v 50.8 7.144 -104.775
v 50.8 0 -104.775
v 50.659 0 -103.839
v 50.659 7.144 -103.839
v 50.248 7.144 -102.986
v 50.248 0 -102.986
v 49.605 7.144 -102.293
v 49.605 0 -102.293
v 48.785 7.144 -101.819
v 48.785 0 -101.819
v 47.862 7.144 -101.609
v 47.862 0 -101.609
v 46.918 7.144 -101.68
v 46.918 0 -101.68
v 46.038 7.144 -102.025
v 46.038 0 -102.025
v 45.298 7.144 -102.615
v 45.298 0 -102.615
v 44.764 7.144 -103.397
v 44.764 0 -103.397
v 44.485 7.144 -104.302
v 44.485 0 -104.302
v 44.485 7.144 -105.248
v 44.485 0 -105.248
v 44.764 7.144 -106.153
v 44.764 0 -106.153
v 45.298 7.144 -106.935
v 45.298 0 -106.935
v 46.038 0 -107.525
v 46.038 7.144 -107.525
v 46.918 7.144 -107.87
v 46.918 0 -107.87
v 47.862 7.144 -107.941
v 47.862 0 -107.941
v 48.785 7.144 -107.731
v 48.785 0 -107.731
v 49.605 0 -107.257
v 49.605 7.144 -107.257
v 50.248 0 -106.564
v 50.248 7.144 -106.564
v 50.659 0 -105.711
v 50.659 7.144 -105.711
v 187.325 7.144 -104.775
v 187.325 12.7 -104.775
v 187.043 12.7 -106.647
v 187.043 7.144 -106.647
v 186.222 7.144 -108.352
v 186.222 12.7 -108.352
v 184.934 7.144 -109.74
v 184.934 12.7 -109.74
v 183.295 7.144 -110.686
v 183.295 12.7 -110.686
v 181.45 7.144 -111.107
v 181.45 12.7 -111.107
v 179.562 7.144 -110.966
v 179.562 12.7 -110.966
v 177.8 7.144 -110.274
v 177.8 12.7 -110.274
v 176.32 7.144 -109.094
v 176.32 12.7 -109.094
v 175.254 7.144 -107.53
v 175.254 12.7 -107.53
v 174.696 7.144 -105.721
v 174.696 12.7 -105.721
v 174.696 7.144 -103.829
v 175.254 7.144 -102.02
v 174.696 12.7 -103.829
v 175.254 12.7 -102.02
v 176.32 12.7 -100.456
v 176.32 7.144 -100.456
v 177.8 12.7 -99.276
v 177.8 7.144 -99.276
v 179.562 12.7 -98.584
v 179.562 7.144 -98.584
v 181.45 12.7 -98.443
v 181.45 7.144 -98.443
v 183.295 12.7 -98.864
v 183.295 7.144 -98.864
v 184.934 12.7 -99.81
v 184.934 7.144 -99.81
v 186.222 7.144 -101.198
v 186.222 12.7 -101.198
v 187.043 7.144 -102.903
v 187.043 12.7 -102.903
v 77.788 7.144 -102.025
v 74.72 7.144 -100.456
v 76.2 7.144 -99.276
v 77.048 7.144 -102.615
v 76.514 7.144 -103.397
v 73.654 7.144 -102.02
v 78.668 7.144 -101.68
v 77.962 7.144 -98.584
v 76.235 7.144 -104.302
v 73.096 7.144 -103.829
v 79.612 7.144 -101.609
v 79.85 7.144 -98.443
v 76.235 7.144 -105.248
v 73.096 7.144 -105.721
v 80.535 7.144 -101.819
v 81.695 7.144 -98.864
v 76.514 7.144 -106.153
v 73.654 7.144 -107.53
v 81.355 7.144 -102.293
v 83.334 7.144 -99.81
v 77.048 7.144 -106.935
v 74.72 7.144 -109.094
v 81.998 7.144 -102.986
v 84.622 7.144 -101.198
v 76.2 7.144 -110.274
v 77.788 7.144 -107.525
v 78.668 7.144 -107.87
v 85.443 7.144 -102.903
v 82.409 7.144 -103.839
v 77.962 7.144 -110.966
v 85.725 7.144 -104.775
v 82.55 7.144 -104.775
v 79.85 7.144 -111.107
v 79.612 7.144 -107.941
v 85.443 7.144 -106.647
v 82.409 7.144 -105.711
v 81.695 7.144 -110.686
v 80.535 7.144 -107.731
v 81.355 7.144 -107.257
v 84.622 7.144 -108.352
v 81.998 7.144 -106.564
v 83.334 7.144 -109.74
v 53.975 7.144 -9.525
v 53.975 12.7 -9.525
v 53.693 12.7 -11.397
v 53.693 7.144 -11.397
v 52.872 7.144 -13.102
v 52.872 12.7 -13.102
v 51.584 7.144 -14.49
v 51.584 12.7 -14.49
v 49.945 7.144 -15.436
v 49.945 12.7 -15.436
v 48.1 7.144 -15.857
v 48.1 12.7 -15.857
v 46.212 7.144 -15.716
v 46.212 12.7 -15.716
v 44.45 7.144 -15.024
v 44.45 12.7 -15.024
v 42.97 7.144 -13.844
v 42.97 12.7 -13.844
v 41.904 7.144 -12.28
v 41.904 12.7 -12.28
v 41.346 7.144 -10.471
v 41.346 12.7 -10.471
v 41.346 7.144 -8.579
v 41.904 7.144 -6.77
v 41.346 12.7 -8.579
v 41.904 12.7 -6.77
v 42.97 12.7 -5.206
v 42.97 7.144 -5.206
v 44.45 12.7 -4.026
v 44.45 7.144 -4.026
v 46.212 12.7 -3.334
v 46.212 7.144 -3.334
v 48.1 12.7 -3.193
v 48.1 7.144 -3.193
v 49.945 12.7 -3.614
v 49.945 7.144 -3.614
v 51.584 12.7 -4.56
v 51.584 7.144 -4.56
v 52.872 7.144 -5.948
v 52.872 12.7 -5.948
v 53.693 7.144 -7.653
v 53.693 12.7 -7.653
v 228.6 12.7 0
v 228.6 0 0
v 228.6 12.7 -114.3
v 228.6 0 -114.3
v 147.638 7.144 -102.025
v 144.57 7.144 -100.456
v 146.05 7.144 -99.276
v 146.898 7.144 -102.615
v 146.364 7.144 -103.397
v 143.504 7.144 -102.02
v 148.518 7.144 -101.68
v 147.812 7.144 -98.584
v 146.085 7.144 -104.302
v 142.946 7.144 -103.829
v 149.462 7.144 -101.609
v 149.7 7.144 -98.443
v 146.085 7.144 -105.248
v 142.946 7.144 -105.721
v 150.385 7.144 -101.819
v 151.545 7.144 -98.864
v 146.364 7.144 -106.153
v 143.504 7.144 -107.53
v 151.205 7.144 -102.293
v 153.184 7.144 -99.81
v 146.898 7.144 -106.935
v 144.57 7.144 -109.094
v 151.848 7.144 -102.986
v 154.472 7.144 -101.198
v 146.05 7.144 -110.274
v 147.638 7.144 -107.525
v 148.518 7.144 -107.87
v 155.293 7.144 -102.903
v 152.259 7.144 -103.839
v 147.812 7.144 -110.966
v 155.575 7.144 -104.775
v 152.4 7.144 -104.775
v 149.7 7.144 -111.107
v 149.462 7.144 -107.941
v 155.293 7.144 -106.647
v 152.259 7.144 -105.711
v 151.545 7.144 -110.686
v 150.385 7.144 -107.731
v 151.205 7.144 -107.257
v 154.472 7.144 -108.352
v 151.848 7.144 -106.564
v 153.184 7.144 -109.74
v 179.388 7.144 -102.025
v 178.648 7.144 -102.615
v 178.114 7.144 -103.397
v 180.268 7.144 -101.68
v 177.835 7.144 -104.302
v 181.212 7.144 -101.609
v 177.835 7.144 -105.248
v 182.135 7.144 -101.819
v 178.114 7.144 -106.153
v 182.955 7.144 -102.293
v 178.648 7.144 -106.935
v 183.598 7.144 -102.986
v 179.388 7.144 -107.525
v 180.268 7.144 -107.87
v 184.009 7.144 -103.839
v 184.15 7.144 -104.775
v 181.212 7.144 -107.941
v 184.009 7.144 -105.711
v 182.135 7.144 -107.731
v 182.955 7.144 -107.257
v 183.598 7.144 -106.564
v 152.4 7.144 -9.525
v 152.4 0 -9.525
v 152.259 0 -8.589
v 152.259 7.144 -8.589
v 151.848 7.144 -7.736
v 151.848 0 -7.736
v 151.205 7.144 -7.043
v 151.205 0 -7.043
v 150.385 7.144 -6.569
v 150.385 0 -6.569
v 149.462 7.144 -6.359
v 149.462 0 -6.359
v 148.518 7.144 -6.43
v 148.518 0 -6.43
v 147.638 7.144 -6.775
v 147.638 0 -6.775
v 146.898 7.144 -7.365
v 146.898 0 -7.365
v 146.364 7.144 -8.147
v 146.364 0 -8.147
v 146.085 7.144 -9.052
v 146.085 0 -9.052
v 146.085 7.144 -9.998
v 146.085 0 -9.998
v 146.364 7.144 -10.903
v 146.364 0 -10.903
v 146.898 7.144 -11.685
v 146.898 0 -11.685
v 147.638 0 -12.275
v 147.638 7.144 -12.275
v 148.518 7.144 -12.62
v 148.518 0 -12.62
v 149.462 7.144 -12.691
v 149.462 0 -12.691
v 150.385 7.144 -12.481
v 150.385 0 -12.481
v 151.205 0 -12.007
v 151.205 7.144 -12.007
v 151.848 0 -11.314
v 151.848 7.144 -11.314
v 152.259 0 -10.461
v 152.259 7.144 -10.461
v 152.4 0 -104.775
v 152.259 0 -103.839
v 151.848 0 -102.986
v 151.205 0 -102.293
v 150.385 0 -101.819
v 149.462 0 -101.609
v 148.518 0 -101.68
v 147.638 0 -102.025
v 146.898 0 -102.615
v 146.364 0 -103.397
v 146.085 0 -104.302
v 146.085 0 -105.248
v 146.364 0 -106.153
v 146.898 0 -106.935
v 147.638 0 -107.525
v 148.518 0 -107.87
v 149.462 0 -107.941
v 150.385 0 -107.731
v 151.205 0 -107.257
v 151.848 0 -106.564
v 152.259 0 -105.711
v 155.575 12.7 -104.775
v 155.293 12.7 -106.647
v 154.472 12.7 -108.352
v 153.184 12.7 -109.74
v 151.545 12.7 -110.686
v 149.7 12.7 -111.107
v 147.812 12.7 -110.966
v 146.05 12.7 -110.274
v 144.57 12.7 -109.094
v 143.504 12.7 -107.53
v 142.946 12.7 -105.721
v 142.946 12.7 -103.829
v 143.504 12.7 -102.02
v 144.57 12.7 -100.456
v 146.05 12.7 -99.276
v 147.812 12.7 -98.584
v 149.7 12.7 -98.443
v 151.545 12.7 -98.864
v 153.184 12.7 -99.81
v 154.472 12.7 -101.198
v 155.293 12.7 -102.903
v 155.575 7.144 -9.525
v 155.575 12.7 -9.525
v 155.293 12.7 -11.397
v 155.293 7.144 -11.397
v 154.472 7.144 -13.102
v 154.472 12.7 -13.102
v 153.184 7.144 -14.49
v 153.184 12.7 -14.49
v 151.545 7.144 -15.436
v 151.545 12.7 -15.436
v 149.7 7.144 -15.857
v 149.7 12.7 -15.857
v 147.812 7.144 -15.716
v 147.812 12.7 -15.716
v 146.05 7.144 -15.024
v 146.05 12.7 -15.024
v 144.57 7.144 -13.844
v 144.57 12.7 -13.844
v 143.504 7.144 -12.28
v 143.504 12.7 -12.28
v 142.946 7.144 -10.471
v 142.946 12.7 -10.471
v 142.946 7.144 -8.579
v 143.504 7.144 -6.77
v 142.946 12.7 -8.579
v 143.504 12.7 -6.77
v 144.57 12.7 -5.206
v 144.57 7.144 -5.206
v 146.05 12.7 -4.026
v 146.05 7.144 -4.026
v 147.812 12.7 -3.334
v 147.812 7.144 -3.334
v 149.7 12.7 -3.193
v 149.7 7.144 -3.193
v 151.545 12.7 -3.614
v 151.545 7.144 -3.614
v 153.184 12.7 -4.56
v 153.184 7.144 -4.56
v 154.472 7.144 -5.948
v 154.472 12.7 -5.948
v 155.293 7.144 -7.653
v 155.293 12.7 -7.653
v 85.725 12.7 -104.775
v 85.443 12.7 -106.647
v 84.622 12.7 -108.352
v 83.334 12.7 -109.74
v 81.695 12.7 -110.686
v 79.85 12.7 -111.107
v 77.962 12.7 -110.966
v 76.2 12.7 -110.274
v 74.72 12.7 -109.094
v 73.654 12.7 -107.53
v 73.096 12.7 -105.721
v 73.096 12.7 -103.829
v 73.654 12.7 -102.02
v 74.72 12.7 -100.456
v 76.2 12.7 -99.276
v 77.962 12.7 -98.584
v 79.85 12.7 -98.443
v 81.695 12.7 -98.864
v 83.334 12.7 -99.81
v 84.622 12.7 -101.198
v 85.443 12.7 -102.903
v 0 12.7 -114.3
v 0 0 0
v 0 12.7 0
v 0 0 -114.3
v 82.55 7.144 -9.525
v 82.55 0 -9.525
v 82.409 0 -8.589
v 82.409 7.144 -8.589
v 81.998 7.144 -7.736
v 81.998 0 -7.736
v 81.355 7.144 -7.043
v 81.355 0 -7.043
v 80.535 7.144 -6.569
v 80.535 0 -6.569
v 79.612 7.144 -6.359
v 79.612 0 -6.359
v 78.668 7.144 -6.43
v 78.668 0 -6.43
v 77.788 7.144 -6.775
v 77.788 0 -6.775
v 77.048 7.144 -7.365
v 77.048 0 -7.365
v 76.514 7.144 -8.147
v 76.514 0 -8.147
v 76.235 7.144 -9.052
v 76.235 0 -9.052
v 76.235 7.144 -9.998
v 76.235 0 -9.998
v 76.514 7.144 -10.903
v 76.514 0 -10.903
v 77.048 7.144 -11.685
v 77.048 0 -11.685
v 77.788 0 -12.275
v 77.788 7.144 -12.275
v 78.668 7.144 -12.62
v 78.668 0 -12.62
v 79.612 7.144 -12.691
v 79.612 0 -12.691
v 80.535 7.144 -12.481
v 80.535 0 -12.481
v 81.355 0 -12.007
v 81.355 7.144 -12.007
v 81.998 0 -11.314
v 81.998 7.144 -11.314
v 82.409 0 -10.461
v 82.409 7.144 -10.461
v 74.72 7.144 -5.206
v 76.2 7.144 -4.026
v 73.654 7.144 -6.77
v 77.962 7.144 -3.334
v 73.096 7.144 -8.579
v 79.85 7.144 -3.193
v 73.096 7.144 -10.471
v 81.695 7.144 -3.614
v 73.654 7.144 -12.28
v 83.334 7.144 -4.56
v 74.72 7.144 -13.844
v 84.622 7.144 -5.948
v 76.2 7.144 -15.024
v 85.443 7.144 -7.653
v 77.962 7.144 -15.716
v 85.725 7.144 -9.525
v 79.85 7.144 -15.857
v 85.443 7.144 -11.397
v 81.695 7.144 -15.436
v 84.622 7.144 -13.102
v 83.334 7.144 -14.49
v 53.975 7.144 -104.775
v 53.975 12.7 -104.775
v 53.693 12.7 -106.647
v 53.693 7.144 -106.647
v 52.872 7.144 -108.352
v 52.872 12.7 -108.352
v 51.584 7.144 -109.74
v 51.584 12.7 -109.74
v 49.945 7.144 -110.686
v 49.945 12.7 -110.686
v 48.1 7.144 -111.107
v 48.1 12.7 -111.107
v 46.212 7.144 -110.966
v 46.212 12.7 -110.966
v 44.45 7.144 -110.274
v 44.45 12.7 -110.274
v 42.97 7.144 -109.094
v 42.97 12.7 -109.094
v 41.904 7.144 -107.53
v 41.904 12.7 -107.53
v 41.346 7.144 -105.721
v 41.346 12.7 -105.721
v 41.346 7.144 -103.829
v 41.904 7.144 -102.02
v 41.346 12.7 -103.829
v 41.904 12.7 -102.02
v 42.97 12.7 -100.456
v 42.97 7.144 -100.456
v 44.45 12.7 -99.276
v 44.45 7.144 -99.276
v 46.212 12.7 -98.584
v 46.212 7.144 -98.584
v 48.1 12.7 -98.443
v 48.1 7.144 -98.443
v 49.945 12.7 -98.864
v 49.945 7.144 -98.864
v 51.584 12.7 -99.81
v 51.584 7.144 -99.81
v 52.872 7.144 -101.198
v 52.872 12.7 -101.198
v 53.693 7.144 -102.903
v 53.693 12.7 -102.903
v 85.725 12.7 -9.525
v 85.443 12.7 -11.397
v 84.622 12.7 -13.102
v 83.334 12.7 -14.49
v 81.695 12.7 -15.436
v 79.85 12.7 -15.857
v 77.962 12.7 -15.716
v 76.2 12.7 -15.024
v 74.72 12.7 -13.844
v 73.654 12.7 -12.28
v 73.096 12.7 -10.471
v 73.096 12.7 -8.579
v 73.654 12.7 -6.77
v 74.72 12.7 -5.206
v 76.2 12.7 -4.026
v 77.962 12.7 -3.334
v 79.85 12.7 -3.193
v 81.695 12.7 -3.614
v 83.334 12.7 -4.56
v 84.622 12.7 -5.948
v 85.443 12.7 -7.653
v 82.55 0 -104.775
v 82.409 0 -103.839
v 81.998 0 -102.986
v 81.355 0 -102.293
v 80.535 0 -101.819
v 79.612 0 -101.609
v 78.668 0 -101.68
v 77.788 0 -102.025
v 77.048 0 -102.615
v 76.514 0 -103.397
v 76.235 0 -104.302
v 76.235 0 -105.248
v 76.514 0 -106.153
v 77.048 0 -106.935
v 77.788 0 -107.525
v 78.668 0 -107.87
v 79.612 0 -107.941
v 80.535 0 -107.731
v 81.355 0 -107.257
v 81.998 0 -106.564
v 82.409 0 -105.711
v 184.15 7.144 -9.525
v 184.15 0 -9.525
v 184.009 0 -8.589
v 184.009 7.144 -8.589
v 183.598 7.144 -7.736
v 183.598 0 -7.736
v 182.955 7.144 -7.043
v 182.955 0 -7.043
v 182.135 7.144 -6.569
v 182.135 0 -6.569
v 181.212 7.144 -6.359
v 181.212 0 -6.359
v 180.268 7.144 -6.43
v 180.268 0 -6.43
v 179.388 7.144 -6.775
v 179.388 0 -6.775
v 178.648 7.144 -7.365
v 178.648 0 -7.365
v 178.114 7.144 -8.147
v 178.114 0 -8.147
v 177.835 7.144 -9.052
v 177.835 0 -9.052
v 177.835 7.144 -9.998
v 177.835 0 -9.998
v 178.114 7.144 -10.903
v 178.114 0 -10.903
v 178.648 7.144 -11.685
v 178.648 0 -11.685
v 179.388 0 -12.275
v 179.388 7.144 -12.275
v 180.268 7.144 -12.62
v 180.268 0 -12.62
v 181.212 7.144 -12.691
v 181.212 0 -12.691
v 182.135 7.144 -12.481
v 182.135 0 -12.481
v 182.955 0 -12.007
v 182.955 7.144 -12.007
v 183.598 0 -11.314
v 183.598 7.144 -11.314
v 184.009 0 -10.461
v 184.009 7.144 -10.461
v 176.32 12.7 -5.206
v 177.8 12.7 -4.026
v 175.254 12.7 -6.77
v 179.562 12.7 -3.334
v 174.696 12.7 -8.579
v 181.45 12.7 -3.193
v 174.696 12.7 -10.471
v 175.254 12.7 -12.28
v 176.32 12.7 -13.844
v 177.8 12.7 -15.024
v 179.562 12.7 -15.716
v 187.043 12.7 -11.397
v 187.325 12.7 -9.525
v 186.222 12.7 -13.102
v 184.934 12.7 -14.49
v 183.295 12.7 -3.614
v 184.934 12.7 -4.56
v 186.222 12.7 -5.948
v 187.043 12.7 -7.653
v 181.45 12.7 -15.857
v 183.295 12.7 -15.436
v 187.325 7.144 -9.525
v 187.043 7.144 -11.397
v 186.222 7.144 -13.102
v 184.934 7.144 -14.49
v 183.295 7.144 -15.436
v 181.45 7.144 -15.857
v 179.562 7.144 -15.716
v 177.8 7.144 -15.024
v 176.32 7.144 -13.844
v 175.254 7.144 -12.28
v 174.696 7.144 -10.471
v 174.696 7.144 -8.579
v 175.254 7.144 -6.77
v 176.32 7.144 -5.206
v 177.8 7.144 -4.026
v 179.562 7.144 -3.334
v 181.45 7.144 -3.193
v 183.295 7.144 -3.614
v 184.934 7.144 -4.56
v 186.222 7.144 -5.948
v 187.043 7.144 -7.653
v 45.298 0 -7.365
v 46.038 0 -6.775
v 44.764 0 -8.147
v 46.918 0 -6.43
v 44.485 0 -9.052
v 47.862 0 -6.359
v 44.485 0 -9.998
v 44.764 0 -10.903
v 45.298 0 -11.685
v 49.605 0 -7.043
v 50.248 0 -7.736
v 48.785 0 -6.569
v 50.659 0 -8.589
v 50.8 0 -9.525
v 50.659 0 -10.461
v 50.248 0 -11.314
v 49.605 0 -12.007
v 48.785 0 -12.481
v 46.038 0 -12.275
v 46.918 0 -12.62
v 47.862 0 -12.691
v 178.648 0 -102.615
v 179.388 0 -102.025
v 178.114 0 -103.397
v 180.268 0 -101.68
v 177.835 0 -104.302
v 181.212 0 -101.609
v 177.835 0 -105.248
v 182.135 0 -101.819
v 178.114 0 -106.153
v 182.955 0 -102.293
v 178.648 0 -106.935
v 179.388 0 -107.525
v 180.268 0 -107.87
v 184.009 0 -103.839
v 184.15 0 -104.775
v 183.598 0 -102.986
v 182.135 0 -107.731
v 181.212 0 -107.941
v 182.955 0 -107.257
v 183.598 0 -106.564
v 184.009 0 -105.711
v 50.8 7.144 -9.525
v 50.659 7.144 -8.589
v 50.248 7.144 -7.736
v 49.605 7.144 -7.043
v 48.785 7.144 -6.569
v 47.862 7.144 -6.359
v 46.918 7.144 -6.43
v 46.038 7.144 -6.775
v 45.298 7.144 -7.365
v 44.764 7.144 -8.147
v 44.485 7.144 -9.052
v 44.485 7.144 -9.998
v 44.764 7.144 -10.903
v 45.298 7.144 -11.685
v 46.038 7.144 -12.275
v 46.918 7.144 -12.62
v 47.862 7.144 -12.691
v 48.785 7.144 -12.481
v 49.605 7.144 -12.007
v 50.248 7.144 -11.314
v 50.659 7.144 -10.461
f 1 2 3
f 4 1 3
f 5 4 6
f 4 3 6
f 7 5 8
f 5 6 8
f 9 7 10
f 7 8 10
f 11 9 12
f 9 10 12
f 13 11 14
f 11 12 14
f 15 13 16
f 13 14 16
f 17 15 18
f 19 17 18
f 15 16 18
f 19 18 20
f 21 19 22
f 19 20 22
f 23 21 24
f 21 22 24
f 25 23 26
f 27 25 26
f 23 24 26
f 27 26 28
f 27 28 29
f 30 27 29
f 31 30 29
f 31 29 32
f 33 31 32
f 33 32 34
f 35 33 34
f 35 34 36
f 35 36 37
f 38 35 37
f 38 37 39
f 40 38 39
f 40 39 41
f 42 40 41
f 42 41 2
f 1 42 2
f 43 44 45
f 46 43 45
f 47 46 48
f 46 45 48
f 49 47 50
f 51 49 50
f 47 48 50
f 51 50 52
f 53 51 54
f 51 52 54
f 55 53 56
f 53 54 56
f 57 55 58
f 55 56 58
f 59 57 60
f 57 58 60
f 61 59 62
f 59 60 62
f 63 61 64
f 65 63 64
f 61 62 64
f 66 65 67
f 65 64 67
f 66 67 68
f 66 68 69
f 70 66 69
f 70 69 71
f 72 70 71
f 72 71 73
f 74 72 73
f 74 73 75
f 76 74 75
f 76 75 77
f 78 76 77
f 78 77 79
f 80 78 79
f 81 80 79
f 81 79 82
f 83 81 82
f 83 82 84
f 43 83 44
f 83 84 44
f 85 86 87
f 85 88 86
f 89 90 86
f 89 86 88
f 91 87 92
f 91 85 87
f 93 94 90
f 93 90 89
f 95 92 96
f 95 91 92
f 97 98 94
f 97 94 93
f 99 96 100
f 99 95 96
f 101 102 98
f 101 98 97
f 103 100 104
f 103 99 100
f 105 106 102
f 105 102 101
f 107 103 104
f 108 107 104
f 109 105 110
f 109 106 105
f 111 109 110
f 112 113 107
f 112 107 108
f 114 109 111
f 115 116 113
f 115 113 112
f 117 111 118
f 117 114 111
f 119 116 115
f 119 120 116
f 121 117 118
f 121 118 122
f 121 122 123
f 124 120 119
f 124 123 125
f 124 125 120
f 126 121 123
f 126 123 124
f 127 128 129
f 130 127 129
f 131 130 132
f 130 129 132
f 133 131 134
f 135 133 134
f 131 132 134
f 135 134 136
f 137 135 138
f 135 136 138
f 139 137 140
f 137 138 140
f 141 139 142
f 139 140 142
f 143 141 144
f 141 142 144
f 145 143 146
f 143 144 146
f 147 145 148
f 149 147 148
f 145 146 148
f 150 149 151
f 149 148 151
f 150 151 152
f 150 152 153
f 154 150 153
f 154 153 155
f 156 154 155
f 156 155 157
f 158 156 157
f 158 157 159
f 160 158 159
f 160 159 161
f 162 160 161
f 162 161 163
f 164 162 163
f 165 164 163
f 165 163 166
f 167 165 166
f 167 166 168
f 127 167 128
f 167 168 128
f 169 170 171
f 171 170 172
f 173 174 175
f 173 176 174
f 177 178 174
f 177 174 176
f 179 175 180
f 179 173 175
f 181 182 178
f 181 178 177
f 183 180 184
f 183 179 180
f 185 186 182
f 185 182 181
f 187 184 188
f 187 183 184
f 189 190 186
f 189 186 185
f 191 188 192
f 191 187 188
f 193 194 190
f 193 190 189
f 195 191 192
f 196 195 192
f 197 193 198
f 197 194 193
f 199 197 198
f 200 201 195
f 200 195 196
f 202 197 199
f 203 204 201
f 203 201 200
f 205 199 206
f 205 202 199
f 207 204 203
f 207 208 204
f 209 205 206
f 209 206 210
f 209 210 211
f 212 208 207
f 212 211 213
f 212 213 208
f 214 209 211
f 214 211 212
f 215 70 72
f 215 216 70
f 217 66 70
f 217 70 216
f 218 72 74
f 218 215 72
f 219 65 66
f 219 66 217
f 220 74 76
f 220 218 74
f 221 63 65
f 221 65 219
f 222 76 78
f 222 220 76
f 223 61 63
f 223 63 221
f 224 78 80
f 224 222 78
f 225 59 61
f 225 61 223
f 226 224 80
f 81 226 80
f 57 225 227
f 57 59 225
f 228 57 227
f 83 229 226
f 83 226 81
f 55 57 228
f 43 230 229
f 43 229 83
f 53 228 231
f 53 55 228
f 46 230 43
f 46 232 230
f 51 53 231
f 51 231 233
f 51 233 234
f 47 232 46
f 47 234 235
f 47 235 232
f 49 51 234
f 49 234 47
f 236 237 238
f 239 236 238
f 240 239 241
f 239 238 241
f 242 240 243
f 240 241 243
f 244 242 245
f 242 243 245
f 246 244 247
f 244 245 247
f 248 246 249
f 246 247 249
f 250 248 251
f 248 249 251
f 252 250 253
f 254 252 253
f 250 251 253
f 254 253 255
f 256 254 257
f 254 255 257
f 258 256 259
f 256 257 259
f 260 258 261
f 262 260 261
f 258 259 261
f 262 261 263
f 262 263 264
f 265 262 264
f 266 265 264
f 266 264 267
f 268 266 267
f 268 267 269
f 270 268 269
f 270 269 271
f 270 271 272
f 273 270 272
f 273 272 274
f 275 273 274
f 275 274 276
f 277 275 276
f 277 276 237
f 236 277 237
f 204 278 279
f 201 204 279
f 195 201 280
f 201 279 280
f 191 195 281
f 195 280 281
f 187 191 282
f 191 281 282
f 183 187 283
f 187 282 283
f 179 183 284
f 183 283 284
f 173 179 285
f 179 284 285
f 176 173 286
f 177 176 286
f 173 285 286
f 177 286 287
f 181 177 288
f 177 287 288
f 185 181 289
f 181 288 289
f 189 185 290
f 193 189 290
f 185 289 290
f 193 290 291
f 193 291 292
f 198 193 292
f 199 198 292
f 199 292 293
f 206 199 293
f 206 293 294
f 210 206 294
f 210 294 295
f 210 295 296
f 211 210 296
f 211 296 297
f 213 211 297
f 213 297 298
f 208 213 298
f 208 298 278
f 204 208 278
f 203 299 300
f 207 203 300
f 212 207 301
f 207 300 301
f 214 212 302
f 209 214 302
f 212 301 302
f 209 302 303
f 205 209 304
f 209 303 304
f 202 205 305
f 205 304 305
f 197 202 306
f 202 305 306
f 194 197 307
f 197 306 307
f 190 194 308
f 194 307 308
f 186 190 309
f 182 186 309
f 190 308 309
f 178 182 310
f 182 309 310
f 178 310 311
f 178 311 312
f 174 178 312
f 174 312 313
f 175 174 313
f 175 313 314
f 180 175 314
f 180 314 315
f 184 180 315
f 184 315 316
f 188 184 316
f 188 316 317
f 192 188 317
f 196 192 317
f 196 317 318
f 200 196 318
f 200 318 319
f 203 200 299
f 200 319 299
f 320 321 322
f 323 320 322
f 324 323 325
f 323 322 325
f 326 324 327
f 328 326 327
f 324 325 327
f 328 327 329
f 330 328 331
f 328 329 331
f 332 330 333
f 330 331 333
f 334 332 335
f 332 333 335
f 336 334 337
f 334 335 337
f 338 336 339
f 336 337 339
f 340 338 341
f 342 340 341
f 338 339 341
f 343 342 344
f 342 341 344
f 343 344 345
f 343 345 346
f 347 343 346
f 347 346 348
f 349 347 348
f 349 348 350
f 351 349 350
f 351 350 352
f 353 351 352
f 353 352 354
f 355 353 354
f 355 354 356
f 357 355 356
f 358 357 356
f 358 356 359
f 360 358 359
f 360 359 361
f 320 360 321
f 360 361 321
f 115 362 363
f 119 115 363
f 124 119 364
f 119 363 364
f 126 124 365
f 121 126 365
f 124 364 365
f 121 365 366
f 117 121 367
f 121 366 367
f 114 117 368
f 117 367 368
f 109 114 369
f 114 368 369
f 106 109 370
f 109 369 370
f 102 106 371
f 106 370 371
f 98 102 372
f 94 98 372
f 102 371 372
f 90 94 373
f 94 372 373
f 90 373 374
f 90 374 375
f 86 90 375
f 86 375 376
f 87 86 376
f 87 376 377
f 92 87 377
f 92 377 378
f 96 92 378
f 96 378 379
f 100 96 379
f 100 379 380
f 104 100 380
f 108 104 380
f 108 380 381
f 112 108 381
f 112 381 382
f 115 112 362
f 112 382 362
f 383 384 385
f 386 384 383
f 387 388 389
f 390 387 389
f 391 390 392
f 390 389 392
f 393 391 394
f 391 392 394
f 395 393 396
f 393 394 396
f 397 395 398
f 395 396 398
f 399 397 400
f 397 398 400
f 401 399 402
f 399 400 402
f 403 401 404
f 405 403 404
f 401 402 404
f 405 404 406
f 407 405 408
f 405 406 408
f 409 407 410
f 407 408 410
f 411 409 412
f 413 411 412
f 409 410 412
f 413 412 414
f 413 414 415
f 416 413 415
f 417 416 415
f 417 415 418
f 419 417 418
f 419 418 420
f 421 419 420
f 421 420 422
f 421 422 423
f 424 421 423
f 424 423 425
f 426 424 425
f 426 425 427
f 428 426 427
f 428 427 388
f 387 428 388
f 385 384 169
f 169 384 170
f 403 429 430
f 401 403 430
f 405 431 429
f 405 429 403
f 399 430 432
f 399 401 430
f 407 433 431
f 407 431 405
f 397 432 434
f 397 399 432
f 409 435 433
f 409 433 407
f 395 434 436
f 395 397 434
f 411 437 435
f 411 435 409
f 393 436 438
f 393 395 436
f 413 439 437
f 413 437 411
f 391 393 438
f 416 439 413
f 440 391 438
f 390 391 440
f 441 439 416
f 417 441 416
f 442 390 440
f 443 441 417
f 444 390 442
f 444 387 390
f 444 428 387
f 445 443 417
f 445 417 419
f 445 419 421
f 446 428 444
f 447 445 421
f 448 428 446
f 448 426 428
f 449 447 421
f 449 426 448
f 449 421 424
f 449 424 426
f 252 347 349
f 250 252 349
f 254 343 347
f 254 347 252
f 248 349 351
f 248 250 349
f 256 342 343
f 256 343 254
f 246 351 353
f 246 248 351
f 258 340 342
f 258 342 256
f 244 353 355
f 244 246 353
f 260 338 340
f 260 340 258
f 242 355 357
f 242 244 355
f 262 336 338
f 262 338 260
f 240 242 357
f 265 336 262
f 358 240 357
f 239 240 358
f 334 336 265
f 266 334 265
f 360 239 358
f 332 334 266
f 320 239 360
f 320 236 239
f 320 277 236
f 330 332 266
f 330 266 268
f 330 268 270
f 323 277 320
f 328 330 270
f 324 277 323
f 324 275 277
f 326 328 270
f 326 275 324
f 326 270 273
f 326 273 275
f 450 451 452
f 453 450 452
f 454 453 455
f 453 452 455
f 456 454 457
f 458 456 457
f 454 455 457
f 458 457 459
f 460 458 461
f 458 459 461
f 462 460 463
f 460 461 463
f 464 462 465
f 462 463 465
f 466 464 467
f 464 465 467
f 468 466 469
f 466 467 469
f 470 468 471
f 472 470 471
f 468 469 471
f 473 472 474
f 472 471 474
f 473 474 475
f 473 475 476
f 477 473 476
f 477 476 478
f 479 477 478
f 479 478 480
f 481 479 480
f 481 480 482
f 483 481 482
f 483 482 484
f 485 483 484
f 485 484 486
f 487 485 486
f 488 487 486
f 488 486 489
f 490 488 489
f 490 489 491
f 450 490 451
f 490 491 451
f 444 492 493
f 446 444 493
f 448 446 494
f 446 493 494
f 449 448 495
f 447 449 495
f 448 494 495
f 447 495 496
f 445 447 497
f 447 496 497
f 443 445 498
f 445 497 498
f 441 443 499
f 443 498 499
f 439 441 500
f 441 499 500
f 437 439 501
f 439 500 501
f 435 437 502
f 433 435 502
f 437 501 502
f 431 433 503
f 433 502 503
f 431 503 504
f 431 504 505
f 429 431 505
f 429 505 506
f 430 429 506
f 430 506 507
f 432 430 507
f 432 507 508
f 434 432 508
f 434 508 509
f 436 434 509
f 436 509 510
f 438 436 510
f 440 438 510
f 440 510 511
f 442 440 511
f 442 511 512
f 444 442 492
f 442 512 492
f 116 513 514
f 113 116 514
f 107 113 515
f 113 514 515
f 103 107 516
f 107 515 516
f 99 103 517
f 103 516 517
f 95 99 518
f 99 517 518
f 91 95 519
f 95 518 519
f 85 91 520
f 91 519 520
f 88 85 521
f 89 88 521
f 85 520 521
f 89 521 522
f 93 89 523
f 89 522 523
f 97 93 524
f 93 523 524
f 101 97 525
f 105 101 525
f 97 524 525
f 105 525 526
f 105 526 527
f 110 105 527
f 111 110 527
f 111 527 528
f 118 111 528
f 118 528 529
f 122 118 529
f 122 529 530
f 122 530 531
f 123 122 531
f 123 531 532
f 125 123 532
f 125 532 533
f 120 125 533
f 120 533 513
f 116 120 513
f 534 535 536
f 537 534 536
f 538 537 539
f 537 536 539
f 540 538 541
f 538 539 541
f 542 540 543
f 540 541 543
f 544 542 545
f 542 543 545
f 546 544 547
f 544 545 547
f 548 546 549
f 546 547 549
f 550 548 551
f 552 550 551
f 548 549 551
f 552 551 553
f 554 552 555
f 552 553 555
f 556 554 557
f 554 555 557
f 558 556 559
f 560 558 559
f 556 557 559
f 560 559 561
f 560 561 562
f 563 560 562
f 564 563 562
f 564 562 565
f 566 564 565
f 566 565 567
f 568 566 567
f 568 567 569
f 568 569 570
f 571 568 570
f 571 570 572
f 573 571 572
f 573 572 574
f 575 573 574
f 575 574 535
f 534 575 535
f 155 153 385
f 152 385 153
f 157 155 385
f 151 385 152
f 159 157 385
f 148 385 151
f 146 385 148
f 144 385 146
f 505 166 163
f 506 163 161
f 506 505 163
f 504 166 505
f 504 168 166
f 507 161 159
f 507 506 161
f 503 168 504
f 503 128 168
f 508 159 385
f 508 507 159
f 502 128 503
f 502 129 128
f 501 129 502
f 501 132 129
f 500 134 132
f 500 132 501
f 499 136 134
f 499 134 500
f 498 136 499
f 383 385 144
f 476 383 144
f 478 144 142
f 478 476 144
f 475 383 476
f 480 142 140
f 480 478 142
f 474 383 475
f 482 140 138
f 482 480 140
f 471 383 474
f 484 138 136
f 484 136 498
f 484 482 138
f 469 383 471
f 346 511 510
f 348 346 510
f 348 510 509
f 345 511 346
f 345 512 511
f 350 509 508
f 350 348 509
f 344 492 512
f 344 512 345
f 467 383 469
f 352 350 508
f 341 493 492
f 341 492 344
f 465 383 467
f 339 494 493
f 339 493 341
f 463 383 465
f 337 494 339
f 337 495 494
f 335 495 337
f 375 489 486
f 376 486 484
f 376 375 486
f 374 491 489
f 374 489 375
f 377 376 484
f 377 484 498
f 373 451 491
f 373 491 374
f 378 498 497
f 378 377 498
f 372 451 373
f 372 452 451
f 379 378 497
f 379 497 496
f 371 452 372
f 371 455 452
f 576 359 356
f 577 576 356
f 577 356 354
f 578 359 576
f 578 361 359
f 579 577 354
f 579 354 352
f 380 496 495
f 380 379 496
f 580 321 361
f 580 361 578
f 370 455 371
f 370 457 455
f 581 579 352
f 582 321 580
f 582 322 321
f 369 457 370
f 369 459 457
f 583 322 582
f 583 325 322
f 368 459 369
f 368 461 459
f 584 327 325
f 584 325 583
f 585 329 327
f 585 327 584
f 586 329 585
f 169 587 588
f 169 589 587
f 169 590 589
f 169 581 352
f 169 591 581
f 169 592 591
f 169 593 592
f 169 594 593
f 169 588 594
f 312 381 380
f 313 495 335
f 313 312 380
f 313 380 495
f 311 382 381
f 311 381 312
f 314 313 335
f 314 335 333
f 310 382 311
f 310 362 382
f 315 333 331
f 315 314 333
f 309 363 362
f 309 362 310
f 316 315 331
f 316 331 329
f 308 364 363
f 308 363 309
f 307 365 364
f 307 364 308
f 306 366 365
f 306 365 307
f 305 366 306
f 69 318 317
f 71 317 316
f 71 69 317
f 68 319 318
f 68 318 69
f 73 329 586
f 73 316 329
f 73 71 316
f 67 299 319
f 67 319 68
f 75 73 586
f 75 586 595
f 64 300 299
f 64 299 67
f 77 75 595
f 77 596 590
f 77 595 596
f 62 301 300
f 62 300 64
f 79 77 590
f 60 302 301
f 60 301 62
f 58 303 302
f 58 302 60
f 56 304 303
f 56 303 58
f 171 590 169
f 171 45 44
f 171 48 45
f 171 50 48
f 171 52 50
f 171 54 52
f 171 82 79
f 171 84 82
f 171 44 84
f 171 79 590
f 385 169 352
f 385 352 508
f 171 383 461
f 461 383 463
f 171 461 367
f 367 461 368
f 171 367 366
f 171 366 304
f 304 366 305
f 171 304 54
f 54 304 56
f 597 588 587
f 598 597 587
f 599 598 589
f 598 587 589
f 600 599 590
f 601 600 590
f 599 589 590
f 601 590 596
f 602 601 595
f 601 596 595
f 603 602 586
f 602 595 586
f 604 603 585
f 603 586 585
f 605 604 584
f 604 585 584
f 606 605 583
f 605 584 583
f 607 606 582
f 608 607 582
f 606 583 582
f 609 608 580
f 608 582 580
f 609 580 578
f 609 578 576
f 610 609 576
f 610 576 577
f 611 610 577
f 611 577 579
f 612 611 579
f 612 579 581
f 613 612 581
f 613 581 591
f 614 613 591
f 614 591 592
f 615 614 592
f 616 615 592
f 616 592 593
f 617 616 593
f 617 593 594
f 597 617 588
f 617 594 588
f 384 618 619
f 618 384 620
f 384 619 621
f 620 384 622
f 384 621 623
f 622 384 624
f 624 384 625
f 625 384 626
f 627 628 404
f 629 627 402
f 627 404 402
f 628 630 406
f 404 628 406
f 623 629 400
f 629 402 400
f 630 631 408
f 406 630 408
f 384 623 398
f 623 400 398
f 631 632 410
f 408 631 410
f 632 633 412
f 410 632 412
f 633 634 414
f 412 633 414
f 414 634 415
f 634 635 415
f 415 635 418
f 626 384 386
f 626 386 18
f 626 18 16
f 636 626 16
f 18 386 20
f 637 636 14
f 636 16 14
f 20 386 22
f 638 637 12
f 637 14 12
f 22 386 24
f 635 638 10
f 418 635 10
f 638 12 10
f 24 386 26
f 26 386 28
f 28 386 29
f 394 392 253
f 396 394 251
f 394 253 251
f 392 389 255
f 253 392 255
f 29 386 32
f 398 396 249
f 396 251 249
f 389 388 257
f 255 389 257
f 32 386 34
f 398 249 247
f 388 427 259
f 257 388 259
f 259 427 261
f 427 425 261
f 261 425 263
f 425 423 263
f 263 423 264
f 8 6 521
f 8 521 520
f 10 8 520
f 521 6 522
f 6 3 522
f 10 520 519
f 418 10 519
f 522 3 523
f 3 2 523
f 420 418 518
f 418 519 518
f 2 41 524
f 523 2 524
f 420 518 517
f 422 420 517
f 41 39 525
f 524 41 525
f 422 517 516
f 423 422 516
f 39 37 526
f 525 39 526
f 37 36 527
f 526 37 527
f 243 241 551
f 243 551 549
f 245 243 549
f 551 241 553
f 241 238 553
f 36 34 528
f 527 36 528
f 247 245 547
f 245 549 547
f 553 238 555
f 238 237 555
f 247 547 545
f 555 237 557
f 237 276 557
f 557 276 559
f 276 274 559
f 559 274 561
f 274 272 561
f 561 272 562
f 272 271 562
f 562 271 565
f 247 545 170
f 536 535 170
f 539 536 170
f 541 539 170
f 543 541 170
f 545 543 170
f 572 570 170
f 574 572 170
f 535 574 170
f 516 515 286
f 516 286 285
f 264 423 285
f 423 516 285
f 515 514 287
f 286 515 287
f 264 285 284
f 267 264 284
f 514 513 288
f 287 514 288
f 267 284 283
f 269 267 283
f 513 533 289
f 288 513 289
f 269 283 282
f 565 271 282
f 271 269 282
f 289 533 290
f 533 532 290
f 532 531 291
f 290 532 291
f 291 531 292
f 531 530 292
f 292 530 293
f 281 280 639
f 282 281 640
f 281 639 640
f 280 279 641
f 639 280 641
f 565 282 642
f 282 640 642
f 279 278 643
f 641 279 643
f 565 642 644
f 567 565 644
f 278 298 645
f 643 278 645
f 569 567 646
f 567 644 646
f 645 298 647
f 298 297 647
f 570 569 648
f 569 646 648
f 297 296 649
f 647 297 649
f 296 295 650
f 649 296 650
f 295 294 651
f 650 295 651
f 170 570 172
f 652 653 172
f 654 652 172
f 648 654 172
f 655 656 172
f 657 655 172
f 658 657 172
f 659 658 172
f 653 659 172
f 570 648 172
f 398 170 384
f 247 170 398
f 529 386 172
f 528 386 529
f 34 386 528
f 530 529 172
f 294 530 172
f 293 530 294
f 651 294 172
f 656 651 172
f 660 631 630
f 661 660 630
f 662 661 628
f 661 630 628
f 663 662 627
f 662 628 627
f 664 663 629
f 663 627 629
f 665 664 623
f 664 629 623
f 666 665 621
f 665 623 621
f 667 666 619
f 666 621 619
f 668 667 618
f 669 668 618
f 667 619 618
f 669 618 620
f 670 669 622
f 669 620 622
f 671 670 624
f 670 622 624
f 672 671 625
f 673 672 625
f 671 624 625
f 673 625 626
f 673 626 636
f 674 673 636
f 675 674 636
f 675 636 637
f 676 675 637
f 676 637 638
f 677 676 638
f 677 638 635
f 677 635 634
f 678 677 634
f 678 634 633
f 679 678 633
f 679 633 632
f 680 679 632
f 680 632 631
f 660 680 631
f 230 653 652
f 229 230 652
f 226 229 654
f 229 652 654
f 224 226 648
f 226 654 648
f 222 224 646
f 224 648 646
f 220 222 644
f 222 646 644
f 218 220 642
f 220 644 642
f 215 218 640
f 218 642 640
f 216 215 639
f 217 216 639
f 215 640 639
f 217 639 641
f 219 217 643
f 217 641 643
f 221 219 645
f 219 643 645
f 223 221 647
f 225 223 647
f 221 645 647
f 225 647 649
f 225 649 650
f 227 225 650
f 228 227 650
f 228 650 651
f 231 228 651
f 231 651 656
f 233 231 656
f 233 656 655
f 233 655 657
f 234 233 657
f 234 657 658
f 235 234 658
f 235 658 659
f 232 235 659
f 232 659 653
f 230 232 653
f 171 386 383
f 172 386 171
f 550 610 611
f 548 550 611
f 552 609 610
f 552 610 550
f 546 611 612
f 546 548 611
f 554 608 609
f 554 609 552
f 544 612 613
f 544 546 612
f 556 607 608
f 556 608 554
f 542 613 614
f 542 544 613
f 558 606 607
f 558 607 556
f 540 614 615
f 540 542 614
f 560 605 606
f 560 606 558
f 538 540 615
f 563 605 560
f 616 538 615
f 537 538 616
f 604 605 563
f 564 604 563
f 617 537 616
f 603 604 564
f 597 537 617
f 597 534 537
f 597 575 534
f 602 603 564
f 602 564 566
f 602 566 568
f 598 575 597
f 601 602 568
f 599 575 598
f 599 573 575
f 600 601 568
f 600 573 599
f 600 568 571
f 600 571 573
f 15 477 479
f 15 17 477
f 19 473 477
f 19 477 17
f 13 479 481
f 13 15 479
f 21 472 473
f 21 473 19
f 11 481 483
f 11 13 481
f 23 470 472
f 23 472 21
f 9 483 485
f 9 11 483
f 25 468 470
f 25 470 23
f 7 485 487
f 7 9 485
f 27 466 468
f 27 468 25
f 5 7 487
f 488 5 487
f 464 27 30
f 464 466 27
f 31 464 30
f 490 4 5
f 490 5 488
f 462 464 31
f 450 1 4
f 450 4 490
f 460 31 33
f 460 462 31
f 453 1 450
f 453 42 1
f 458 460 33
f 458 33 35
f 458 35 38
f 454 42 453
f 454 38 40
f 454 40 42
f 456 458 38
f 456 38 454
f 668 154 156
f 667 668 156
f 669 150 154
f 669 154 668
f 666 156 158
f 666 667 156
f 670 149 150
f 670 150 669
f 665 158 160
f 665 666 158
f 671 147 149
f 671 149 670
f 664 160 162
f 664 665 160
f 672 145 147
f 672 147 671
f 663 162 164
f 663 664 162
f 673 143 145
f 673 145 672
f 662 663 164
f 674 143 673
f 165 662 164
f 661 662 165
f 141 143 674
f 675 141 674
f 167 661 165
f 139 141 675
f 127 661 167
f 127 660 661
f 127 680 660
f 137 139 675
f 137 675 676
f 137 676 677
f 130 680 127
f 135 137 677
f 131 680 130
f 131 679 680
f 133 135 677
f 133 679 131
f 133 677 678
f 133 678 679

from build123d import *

# Parameters (mm, degrees)
SKETCH1_W           = 228.6
SKETCH1_H           = 114.3
BOSS_EXTRUDE1_DEPTH = 12.7
SKETCH2_R           = 3.175
CUT_EXTRUDE1_DEPTH  = 311.912
SKETCH3_R           = 6.35
CUT_EXTRUDE2_DEPTH  = 5.55625


with BuildPart() as part:
    # Sketch1 → Boss-Extrude1 (new body)
    with BuildSketch(Plane(origin=(0, 0, 0), x_dir=(1, 0, 0), z_dir=(0, 1, 0))):
        with Locations((114.3, 57.15)):
            Rectangle(SKETCH1_W, SKETCH1_H)
    extrude(amount=BOSS_EXTRUDE1_DEPTH)

    # Sketch2 → Cut-Extrude1 (cut)
    with BuildSketch(Plane.XZ):
        with Locations((47.625, -9.525)):
            Circle(SKETCH2_R)
        with Locations((79.375, -9.525)):
            Circle(SKETCH2_R)
        with Locations((149.225, -9.525)):
            Circle(SKETCH2_R)
        with Locations((180.975, -9.525)):
            Circle(SKETCH2_R)
        with Locations((47.625, -104.775)):
            Circle(SKETCH2_R)
        with Locations((79.375, -104.775)):
            Circle(SKETCH2_R)
        with Locations((149.225, -104.775)):
            Circle(SKETCH2_R)
        with Locations((180.975, -104.775)):
            Circle(SKETCH2_R)
    extrude(amount=-CUT_EXTRUDE1_DEPTH, mode=Mode.SUBTRACT)

    # Sketch3 → Cut-Extrude2 (cut)
    with BuildSketch(Plane(origin=(0, 12.7, 0), x_dir=(1, 0, 0), z_dir=(0, 1, 0))):
        with Locations((47.625, 104.775)):
            Circle(SKETCH3_R)
        with Locations((79.375, 104.775)):
            Circle(SKETCH3_R)
        with Locations((149.225, 104.775)):
            Circle(SKETCH3_R)
        with Locations((180.975, 104.775)):
            Circle(SKETCH3_R)
        with Locations((47.625, 9.525)):
            Circle(SKETCH3_R)
        with Locations((79.375, 9.525)):
            Circle(SKETCH3_R)
        with Locations((149.225, 9.525)):
            Circle(SKETCH3_R)
        with Locations((180.975, 9.525)):
            Circle(SKETCH3_R)
    extrude(amount=-CUT_EXTRUDE2_DEPTH, mode=Mode.SUBTRACT)


solid = part.part
